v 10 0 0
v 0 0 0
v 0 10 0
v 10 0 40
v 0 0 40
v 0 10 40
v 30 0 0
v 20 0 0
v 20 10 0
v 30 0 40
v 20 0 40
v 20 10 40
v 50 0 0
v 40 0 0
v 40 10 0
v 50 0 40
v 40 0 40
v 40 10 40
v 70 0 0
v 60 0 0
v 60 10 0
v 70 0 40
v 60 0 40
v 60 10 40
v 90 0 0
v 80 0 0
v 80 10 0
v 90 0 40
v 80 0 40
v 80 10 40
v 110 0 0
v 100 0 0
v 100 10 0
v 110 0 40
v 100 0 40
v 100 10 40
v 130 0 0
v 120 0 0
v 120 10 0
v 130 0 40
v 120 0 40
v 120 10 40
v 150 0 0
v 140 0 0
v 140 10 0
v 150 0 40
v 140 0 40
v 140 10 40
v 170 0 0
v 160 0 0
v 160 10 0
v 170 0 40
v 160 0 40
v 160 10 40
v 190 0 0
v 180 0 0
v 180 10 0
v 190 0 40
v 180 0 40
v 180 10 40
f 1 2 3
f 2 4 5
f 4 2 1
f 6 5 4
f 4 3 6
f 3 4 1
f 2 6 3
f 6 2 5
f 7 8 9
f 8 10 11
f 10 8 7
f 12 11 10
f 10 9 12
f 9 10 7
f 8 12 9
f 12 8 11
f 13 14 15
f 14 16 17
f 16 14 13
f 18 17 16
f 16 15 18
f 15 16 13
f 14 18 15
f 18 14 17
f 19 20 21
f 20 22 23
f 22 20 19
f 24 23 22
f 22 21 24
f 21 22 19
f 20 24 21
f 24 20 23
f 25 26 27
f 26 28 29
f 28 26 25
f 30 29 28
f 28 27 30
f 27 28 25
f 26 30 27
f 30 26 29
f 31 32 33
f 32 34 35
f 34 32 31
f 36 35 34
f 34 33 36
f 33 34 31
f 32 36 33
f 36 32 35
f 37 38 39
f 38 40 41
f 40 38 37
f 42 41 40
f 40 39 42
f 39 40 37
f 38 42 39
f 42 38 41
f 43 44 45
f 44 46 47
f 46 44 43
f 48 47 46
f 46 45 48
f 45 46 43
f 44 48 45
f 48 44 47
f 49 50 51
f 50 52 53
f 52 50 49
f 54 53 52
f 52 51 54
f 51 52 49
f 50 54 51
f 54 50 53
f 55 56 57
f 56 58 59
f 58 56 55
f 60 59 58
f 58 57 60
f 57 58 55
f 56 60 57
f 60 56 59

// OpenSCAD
// Cushion Grabber - see README.md for details.
// Author: Joseph M. Joy

function range(stop, start=0,  step=1) = [start: step: stop-1];

// Coords of an isoceles right triangle
function ir_tri(base) = [[0,0], [0, base], [base, 0]];

// Extruded version
module rt_prism(base, height)  {
    linear_extrude(height) polygon(ir_tri(base));
}

// A row of them
module prism_rows(base, height, n) {
    for (i = range(n)) {
         translate([2*base*i, 0, 0]) rt_prism(base, height);
    }
}

// 

prism_rows(10, 40, 10);
